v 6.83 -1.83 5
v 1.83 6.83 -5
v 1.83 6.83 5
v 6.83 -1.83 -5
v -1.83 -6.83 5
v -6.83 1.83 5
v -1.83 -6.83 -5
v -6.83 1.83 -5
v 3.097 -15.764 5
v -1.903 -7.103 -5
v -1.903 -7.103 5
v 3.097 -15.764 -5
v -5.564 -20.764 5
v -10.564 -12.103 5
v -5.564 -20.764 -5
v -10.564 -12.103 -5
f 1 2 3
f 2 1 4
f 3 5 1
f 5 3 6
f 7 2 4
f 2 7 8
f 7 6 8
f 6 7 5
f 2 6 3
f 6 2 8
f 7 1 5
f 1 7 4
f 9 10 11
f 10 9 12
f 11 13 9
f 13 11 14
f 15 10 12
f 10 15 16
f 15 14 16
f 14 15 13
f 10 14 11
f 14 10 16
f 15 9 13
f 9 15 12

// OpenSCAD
difference() {
    rotate([0,0,+30]) {
        cube(10, center=true);
        translate([-10.2,-10.2,0])
            cube(10, center=true);
    }
}
